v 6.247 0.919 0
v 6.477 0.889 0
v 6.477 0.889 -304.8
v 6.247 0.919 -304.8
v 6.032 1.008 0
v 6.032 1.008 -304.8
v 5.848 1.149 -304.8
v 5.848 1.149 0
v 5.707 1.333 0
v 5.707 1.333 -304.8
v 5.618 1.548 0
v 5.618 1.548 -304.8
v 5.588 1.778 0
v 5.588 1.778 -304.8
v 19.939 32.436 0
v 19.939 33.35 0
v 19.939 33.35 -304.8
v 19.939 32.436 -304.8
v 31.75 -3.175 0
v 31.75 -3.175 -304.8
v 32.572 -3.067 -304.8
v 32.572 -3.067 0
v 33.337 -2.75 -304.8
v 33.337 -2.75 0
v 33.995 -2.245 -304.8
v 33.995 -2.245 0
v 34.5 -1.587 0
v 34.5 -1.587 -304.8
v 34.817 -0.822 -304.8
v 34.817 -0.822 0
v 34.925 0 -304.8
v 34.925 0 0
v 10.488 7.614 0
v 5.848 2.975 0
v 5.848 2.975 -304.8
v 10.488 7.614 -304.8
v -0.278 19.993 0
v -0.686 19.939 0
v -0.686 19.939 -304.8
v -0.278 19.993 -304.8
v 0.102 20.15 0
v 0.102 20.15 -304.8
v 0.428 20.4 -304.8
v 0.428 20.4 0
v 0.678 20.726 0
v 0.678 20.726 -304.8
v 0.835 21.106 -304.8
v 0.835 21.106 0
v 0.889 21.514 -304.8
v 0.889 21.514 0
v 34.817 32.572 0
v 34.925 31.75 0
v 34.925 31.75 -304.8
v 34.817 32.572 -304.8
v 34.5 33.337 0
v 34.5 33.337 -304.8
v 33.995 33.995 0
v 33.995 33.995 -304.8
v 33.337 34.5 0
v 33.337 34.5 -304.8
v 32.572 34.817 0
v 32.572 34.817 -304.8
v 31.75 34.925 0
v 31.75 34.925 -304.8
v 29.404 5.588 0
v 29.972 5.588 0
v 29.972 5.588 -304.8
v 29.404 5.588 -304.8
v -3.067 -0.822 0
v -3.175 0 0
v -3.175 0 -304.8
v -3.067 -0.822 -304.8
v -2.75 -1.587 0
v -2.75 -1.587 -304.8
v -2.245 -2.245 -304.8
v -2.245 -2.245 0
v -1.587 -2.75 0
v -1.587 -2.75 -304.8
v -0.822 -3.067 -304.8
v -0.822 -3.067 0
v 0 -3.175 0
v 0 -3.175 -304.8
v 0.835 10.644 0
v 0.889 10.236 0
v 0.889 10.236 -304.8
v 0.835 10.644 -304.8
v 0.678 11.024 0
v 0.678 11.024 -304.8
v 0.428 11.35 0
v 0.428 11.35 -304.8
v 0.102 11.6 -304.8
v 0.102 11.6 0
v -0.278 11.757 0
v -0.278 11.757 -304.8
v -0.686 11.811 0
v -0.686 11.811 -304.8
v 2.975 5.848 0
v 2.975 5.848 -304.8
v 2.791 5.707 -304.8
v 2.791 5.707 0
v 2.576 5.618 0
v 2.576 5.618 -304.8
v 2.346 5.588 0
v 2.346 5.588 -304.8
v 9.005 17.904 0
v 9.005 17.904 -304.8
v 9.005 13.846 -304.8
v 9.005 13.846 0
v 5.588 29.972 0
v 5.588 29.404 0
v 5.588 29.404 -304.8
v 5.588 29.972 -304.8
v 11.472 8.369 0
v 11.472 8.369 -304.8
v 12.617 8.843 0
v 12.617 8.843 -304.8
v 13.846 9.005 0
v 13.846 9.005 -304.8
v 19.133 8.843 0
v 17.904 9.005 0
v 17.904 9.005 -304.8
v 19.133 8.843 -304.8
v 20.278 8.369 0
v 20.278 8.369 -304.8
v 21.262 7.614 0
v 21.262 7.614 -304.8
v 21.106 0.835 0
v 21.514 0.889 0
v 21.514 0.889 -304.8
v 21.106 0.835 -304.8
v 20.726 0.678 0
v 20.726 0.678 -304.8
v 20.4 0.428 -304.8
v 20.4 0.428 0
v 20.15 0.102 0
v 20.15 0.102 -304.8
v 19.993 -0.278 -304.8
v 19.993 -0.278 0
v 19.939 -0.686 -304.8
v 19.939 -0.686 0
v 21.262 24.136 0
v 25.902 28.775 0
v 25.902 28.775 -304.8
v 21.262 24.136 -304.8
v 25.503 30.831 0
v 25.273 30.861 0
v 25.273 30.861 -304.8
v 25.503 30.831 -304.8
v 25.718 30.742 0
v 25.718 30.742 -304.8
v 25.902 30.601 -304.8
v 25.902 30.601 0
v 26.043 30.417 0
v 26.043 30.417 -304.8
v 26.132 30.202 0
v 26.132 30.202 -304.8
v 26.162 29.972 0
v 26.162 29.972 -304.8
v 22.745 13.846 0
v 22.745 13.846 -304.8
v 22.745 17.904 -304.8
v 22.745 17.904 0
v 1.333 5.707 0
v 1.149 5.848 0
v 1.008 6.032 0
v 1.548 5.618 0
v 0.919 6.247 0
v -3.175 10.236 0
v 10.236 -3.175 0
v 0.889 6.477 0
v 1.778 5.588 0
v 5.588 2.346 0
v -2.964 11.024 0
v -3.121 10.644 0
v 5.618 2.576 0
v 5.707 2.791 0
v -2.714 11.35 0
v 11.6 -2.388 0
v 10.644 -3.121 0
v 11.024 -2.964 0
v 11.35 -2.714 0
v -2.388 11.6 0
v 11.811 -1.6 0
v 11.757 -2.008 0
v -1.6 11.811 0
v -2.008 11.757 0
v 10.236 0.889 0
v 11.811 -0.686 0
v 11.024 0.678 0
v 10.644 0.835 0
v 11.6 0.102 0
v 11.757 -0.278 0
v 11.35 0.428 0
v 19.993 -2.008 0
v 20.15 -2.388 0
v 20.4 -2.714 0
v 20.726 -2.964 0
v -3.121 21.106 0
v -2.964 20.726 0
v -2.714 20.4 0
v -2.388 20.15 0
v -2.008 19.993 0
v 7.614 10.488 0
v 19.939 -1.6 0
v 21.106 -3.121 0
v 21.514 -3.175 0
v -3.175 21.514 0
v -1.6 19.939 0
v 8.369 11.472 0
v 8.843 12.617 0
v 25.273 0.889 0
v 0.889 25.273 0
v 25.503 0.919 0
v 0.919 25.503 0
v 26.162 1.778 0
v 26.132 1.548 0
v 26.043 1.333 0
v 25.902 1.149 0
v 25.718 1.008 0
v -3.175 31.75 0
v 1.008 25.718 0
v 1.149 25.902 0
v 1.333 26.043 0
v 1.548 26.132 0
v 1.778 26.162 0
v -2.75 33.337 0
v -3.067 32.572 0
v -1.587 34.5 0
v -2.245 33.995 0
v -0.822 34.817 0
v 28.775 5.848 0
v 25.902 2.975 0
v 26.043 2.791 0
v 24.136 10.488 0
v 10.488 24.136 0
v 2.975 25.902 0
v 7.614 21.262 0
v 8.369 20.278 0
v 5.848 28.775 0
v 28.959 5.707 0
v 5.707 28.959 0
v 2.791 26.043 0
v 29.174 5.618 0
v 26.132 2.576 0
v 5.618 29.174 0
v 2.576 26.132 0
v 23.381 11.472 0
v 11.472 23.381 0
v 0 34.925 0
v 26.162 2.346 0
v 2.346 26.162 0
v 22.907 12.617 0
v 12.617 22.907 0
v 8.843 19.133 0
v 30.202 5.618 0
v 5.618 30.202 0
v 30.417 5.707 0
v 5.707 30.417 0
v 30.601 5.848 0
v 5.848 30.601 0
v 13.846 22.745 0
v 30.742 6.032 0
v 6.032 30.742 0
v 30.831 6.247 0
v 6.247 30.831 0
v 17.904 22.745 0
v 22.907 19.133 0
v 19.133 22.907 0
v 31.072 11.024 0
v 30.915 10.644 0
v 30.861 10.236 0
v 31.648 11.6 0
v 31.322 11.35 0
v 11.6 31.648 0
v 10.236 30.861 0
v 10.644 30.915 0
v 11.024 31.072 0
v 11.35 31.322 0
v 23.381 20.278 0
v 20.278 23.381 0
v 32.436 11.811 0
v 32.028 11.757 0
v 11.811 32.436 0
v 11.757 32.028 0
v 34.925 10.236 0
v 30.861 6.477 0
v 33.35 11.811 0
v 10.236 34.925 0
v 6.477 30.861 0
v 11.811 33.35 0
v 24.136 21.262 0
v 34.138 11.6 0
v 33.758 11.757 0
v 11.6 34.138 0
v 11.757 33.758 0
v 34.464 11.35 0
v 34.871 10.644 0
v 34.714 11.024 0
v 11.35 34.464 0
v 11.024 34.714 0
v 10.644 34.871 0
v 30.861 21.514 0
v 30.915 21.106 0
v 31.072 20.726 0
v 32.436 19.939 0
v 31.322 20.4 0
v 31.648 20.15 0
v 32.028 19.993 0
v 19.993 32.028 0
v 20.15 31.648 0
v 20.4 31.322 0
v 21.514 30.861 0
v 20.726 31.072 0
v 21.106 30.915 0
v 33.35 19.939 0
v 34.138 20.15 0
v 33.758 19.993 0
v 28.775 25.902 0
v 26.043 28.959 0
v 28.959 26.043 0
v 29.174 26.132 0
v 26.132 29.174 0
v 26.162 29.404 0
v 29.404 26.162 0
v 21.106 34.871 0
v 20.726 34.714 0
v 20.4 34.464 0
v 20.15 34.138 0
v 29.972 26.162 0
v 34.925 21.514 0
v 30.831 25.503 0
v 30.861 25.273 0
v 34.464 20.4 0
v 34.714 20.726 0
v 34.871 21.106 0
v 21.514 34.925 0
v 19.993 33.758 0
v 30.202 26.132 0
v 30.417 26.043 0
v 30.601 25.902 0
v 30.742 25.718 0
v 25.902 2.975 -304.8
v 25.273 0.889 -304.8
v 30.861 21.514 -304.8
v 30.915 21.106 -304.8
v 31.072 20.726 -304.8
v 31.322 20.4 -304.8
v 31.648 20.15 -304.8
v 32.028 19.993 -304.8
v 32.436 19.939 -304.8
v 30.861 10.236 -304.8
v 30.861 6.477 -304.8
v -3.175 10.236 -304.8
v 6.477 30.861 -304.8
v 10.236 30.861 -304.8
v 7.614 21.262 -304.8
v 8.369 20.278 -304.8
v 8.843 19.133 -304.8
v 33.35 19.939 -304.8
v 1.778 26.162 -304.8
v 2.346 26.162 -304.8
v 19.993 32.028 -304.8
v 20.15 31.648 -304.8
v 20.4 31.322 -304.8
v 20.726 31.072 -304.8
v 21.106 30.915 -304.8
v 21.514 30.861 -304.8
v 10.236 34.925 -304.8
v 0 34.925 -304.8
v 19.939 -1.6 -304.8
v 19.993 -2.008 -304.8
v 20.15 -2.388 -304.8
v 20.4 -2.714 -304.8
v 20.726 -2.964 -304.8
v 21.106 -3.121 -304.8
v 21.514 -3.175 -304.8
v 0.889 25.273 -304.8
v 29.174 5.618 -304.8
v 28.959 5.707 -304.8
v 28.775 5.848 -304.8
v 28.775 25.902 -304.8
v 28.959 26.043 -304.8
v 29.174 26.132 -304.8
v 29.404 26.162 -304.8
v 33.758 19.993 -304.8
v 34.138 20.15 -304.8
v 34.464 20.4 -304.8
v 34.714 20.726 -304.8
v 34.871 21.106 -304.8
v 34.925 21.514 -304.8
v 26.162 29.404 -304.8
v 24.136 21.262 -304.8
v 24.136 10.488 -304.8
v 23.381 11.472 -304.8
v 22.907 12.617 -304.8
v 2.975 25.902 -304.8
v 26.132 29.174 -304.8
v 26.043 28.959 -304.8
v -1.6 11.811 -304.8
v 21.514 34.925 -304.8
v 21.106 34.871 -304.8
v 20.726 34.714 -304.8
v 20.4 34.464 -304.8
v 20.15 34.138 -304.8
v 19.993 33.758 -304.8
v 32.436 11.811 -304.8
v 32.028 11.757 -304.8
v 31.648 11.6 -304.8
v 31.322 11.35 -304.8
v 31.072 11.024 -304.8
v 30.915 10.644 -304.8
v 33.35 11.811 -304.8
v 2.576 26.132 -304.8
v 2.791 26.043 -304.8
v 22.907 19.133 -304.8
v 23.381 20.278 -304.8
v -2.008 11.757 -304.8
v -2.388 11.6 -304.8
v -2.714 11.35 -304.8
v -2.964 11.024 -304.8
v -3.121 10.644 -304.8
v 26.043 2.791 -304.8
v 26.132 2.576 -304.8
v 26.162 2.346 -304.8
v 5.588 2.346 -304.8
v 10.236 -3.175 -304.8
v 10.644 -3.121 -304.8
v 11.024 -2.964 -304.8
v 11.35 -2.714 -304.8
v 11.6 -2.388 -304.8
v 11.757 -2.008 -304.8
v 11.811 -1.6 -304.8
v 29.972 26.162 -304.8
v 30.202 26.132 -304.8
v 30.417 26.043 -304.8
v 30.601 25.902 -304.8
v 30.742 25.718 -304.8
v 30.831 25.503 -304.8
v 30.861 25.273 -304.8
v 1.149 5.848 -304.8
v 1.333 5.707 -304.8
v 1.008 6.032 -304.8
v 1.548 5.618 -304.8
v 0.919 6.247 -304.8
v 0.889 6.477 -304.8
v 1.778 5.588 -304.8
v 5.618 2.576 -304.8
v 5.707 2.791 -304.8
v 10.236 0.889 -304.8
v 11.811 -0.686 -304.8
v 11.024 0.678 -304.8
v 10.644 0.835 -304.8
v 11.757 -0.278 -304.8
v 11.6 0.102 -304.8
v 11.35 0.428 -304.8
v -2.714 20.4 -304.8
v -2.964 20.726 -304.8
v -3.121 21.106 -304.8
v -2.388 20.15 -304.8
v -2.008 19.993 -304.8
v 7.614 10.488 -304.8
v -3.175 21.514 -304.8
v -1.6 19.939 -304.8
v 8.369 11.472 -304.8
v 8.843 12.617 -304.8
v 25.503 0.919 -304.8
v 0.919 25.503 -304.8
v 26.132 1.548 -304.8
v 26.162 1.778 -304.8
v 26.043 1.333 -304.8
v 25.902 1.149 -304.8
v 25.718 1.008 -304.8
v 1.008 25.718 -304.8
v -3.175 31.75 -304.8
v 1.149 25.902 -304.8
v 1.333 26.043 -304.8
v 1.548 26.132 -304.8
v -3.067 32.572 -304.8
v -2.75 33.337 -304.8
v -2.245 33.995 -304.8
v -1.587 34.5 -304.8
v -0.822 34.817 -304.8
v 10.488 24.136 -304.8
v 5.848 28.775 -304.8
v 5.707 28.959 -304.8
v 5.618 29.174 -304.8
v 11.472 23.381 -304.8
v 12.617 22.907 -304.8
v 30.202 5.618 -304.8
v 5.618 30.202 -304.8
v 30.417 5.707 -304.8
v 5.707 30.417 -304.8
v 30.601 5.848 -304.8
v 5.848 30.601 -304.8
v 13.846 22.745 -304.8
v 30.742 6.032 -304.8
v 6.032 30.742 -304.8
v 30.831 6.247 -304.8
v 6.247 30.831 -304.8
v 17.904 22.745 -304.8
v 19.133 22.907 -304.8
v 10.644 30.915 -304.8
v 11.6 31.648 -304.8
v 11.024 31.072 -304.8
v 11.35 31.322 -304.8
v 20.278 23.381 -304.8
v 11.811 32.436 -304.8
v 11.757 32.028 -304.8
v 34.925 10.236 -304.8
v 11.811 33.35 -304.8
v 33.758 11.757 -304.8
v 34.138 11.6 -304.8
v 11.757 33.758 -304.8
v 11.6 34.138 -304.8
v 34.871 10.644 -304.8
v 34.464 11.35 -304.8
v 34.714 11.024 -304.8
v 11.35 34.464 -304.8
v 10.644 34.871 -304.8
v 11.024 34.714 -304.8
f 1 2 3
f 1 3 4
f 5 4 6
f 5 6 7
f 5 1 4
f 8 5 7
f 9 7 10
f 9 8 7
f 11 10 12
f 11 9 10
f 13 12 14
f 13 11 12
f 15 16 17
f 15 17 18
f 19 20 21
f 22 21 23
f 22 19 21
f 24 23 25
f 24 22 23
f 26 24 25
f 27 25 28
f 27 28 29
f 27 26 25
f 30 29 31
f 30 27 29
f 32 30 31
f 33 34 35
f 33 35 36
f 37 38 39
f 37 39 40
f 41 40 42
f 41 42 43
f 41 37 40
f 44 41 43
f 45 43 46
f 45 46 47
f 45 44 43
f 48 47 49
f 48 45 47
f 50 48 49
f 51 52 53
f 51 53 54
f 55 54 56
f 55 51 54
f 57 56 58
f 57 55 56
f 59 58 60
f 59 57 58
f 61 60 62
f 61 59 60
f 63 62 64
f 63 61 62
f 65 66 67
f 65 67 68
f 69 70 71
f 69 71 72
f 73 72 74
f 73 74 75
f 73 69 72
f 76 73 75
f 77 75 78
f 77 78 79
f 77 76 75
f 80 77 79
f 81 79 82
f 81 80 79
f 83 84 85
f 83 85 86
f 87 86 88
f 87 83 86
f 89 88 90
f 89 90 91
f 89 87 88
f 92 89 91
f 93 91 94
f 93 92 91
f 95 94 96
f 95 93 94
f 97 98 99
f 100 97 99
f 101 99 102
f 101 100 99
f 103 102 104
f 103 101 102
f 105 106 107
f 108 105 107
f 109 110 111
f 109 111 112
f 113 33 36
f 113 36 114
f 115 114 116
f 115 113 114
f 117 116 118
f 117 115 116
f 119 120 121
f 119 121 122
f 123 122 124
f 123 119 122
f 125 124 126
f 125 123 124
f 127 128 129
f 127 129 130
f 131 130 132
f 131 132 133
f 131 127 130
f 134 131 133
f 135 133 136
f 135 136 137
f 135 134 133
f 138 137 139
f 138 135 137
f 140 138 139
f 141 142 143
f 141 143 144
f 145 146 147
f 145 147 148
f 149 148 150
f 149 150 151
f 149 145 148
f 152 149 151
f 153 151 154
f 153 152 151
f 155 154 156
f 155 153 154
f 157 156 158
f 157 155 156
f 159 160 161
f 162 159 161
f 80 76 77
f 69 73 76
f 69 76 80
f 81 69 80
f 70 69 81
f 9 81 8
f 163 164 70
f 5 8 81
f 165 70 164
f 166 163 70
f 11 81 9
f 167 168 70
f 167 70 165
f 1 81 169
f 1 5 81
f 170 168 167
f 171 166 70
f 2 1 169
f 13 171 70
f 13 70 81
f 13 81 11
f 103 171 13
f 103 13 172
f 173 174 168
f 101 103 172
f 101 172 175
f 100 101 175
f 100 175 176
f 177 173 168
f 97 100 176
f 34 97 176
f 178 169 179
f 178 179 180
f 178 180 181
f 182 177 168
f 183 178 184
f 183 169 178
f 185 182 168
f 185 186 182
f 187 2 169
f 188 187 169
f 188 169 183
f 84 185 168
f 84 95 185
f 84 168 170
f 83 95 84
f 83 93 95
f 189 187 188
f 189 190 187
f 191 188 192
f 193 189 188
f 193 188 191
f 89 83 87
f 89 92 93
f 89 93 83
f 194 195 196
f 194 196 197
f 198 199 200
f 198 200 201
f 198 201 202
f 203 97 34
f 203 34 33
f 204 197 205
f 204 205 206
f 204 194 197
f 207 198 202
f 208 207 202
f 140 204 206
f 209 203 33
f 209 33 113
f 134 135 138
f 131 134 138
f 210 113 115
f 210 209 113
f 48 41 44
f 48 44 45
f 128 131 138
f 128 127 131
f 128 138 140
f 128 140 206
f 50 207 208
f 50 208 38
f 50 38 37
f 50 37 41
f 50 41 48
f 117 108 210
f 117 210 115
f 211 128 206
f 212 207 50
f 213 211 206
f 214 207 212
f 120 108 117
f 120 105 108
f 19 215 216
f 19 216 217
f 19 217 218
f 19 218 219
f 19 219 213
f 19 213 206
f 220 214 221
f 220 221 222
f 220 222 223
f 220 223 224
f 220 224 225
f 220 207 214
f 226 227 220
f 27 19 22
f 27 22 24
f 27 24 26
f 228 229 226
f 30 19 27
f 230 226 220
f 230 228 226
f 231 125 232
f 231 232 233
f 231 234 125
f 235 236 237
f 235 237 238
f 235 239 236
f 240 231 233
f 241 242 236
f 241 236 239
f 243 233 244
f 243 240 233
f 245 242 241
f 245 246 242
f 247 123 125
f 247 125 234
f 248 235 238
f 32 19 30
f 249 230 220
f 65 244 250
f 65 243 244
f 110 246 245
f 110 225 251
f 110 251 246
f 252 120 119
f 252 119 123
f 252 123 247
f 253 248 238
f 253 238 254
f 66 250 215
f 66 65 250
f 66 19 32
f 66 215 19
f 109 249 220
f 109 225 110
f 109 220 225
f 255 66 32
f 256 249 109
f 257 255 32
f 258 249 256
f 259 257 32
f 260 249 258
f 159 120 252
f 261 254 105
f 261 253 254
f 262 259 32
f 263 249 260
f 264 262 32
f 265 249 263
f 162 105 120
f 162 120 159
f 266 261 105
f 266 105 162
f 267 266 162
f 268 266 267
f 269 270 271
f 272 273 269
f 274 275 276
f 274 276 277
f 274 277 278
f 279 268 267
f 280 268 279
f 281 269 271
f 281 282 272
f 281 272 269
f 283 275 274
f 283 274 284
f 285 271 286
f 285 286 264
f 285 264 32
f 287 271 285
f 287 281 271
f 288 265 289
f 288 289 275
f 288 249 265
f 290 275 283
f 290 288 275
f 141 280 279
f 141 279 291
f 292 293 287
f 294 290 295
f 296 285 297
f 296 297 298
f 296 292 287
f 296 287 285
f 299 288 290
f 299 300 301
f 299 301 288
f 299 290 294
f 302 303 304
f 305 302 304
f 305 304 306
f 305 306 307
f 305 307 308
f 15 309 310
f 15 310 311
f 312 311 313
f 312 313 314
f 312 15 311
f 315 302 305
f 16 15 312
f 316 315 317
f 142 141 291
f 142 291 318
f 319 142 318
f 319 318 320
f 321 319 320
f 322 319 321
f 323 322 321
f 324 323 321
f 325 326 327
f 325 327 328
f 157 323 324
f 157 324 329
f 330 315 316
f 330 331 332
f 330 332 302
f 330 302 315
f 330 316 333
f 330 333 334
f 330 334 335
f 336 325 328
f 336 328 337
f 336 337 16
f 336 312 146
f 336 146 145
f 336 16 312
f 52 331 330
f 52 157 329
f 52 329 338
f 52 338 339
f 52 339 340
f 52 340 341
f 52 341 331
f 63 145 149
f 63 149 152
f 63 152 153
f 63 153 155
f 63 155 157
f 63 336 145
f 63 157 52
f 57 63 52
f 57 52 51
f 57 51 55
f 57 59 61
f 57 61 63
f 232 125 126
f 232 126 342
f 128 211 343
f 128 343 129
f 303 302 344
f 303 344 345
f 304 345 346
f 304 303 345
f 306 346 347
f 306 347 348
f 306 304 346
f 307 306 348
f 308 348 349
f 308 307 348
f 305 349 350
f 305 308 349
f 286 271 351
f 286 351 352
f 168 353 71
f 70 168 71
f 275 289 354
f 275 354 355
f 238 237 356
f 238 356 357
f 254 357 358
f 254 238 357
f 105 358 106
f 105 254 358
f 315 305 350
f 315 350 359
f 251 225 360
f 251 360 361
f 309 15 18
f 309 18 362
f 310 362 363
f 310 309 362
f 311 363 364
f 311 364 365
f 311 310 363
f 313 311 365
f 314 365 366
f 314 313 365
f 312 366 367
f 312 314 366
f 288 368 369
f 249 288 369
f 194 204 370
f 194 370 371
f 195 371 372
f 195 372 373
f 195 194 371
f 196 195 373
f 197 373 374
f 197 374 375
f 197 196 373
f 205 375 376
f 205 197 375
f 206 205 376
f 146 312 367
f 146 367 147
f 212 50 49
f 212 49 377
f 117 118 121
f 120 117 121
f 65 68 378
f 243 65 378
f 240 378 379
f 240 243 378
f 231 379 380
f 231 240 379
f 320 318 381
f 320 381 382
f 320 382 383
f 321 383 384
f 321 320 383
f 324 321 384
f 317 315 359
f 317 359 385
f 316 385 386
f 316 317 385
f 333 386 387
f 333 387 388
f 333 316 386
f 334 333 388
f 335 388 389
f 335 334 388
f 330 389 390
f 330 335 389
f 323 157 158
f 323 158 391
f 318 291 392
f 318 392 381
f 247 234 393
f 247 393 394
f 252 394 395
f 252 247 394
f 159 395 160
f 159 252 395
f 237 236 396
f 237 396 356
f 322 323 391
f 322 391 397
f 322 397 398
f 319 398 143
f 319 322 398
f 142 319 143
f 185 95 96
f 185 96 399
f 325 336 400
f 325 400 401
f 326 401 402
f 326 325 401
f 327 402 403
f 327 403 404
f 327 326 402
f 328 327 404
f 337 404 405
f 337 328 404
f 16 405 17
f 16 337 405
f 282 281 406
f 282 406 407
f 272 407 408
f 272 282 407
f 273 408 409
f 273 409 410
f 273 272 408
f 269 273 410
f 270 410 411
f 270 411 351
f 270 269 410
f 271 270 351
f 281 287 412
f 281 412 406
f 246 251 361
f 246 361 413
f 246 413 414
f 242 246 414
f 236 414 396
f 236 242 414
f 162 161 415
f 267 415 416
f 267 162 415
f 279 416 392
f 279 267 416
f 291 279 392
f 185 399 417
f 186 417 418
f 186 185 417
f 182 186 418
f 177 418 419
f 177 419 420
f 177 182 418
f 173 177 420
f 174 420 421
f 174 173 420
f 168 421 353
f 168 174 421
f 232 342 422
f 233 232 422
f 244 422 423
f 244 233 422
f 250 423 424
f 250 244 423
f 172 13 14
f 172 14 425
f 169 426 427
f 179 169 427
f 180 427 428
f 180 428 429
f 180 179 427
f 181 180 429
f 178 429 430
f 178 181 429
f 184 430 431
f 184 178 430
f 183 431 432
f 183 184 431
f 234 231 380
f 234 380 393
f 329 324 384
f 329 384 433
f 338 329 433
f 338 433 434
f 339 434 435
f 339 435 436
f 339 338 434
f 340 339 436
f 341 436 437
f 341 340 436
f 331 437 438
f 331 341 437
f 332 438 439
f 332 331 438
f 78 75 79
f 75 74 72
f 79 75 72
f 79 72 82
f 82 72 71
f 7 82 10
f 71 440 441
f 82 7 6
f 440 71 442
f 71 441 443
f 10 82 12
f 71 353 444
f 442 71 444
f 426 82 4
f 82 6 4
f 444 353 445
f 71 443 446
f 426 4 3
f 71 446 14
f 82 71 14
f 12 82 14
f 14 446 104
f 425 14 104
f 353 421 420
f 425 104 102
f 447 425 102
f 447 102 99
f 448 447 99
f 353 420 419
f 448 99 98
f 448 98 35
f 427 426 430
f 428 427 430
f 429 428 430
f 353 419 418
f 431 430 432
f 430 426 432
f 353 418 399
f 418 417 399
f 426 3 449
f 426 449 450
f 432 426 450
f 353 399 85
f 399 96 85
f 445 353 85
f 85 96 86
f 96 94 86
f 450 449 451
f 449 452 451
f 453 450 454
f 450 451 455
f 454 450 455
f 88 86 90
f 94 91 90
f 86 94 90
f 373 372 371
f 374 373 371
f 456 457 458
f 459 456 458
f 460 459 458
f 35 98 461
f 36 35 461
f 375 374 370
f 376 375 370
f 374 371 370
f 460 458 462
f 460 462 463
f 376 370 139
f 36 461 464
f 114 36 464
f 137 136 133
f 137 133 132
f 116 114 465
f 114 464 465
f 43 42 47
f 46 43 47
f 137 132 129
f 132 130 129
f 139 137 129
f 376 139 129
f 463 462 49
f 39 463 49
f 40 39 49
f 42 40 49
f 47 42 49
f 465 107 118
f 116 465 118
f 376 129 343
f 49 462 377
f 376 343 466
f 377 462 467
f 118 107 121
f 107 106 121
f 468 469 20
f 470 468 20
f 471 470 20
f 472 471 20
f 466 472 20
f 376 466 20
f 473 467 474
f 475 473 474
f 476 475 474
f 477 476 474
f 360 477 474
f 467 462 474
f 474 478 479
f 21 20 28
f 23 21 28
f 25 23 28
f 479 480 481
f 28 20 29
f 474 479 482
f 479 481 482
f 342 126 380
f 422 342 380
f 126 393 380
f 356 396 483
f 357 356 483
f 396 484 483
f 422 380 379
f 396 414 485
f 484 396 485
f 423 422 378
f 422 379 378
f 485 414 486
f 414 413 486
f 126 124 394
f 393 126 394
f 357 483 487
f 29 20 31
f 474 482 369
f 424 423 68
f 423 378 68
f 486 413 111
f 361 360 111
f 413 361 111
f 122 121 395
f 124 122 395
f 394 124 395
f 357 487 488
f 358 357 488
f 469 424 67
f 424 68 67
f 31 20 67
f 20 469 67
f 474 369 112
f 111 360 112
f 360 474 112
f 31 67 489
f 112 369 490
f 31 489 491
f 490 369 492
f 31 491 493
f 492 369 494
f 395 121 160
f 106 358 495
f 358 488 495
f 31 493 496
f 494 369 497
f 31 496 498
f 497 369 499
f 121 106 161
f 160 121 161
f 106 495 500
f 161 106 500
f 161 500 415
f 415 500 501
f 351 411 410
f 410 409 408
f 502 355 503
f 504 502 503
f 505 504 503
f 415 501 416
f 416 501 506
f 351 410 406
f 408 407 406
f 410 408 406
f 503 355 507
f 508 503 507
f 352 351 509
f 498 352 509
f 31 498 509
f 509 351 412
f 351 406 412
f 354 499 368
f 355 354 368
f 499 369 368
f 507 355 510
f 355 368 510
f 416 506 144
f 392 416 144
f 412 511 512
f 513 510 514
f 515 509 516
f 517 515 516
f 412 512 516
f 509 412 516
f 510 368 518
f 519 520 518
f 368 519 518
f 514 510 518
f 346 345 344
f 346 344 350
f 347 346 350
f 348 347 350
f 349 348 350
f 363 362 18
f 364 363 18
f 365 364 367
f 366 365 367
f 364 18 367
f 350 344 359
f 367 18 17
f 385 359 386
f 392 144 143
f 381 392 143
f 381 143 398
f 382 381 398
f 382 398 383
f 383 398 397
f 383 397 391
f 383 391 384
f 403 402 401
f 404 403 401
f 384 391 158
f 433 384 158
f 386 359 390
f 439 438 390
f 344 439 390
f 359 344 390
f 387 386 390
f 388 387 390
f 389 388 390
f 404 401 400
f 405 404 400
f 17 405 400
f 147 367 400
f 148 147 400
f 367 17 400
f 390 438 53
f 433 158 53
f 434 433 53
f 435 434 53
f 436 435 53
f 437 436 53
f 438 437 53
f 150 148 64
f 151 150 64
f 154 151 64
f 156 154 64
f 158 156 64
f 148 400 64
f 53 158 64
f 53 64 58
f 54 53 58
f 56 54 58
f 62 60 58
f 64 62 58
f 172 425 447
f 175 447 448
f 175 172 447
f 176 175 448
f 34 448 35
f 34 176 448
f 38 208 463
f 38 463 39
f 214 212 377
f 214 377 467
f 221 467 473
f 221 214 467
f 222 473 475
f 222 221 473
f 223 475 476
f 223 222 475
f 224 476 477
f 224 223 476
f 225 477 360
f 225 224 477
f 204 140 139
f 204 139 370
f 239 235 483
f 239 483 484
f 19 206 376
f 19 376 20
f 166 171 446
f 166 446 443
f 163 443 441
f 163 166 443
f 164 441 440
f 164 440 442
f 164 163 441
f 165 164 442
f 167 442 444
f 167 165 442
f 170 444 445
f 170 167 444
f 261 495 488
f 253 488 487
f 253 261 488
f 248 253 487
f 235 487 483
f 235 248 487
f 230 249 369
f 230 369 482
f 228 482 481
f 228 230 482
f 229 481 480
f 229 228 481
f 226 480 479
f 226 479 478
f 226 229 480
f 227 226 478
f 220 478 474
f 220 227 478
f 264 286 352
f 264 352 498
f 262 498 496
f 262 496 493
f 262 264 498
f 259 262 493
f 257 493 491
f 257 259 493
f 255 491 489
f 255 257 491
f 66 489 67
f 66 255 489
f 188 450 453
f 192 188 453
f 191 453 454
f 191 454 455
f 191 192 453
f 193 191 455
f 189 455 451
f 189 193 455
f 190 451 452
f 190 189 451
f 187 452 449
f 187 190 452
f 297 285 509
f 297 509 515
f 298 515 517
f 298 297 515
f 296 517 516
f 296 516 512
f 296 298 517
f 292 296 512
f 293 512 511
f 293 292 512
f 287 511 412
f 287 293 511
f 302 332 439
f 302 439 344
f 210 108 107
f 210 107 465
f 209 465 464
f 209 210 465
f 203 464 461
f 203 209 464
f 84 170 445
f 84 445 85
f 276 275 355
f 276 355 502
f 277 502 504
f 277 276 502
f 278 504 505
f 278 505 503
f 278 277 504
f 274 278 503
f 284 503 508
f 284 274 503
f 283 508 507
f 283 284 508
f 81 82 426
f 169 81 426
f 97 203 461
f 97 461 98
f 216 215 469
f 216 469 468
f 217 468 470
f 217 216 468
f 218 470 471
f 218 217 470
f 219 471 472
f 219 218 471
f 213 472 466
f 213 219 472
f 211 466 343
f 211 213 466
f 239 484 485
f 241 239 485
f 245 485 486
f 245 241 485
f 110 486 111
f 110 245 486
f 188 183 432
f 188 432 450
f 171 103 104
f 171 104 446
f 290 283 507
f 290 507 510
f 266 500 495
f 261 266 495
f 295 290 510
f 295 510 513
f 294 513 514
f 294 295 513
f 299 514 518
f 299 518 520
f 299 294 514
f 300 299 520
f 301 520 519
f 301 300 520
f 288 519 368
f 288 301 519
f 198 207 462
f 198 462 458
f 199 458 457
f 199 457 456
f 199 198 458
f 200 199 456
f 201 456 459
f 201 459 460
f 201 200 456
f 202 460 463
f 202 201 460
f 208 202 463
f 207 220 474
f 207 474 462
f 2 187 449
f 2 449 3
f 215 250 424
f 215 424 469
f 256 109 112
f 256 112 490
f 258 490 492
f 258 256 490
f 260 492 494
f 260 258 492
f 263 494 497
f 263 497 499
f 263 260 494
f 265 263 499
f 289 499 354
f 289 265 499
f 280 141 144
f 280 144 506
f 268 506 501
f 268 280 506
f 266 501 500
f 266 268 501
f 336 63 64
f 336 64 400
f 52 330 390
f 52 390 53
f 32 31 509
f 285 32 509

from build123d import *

# Parameters (mm, degrees)
F1_DEPTH = 304.8


with BuildPart() as f1:
    # F0 (on Top) → F1 (new body)
    with BuildSketch(Plane.XY):
        with BuildLine():
            ThreePointArc((0, 34.925), (-2.245064, 33.995064), (-3.175, 31.75))
            Line((-3.175, 31.75), (-3.175, 21.5138))
            ThreePointArc((-3.175, 21.5138), (-2.713752, 20.400248), (-1.6002, 19.939))
            Line((-1.6002, 19.939), (-0.6858, 19.939))
            ThreePointArc((-0.6858, 19.939), (0.427752, 20.400248), (0.889, 21.5138))
            Line((0.889, 21.5138), (0.889, 25.273))
            ThreePointArc((0.889, 25.273), (1.149382, 25.901618), (1.778, 26.162))
            Line((1.778, 26.162), (2.346082, 26.162))
            ThreePointArc((2.346082, 26.162), (2.686288, 26.094329), (2.9747, 25.901618))
            Line((2.9747, 25.901618), (7.61416, 21.262158))
            ThreePointArc((7.61416, 21.262158), (8.643787, 19.721212), (9.005344, 17.903543))
            Line((9.005344, 17.903543), (9.005344, 13.846457))
            ThreePointArc((9.005344, 13.846457), (8.643787, 12.028788), (7.61416, 10.487842))
            Line((7.61416, 10.487842), (2.9747, 5.848382))
            ThreePointArc((2.9747, 5.848382), (2.686288, 5.655671), (2.346082, 5.588))
            Line((2.346082, 5.588), (1.778, 5.588))
            ThreePointArc((1.778, 5.588), (1.149382, 5.848382), (0.889, 6.477))
            Line((0.889, 6.477), (0.889, 10.2362))
            ThreePointArc((0.889, 10.2362), (0.427752, 11.349752), (-0.6858, 11.811))
            Line((-0.6858, 11.811), (-1.6002, 11.811))
            ThreePointArc((-1.6002, 11.811), (-2.713752, 11.349752), (-3.175, 10.2362))
            Line((-3.175, 10.2362), (-3.175, 0))
            ThreePointArc((-3.175, 0), (-2.245064, -2.245064), (0, -3.175))
            Line((0, -3.175), (10.2362, -3.175))
            ThreePointArc((10.2362, -3.175), (11.349752, -2.713752), (11.811, -1.6002))
            Line((11.811, -1.6002), (11.811, -0.6858))
            ThreePointArc((11.811, -0.6858), (11.349752, 0.427752), (10.2362, 0.889))
            Line((10.2362, 0.889), (6.477, 0.889))
            ThreePointArc((6.477, 0.889), (5.848382, 1.149382), (5.588, 1.778))
            Line((5.588, 1.778), (5.588, 2.346082))
            ThreePointArc((5.588, 2.346082), (5.655671, 2.686288), (5.848382, 2.9747))
            Line((5.848382, 2.9747), (10.487842, 7.61416))
            ThreePointArc((10.487842, 7.61416), (12.028788, 8.643787), (13.846457, 9.005344))
            Line((13.846457, 9.005344), (17.903543, 9.005344))
            ThreePointArc((17.903543, 9.005344), (19.721212, 8.643787), (21.262158, 7.61416))
            Line((21.262158, 7.61416), (25.901618, 2.9747))
            ThreePointArc((25.901618, 2.9747), (26.094329, 2.686288), (26.162, 2.346082))
            Line((26.162, 2.346082), (26.162, 1.778))
            ThreePointArc((26.162, 1.778), (25.901618, 1.149382), (25.273, 0.889))
            Line((25.273, 0.889), (21.5138, 0.889))
            ThreePointArc((21.5138, 0.889), (20.400248, 0.427752), (19.939, -0.6858))
            Line((19.939, -0.6858), (19.939, -1.6002))
            ThreePointArc((19.939, -1.6002), (20.400248, -2.713752), (21.5138, -3.175))
            Line((21.5138, -3.175), (31.75, -3.175))
            ThreePointArc((31.75, -3.175), (33.995064, -2.245064), (34.925, 0))
            Line((34.925, 0), (34.925, 10.2362))
            ThreePointArc((34.925, 10.2362), (34.463752, 11.349752), (33.3502, 11.811))
            Line((33.3502, 11.811), (32.4358, 11.811))
            ThreePointArc((32.4358, 11.811), (31.322248, 11.349752), (30.861, 10.2362))
            Line((30.861, 10.2362), (30.861, 6.477))
            ThreePointArc((30.861, 6.477), (30.600618, 5.848382), (29.972, 5.588))
            Line((29.972, 5.588), (29.403918, 5.588))
            ThreePointArc((29.403918, 5.588), (29.063712, 5.655671), (28.7753, 5.848382))
            Line((28.7753, 5.848382), (24.13584, 10.487842))
            ThreePointArc((24.13584, 10.487842), (23.106213, 12.028788), (22.744656, 13.846457))
            Line((22.744656, 13.846457), (22.744656, 17.903543))
            ThreePointArc((22.744656, 17.903543), (23.106213, 19.721212), (24.13584, 21.262158))
            Line((24.13584, 21.262158), (28.7753, 25.901618))
            ThreePointArc((28.7753, 25.901618), (29.063712, 26.094329), (29.403918, 26.162))
            Line((29.403918, 26.162), (29.972, 26.162))
            ThreePointArc((29.972, 26.162), (30.600618, 25.901618), (30.861, 25.273))
            Line((30.861, 25.273), (30.861, 21.5138))
            ThreePointArc((30.861, 21.5138), (31.322248, 20.400248), (32.4358, 19.939))
            Line((32.4358, 19.939), (33.3502, 19.939))
            ThreePointArc((33.3502, 19.939), (34.463752, 20.400248), (34.925, 21.5138))
            Line((34.925, 21.5138), (34.925, 31.75))
            ThreePointArc((34.925, 31.75), (33.995064, 33.995064), (31.75, 34.925))
            Line((31.75, 34.925), (21.5138, 34.925))
            ThreePointArc((21.5138, 34.925), (20.400248, 34.463752), (19.939, 33.3502))
            Line((19.939, 33.3502), (19.939, 32.4358))
            ThreePointArc((19.939, 32.4358), (20.400248, 31.322248), (21.5138, 30.861))
            Line((21.5138, 30.861), (25.273, 30.861))
            ThreePointArc((25.273, 30.861), (25.901618, 30.600618), (26.162, 29.972))
            Line((26.162, 29.972), (26.162, 29.403918))
            ThreePointArc((26.162, 29.403918), (26.094329, 29.063712), (25.901618, 28.7753))
            Line((25.901618, 28.7753), (21.262158, 24.13584))
            ThreePointArc((21.262158, 24.13584), (19.721212, 23.106213), (17.903543, 22.744656))
            Line((17.903543, 22.744656), (13.846457, 22.744656))
            ThreePointArc((13.846457, 22.744656), (12.028788, 23.106213), (10.487842, 24.13584))
            Line((10.487842, 24.13584), (5.848382, 28.7753))
            ThreePointArc((5.848382, 28.7753), (5.655671, 29.063712), (5.588, 29.403918))
            Line((5.588, 29.403918), (5.588, 29.972))
            ThreePointArc((5.588, 29.972), (5.848382, 30.600618), (6.477, 30.861))
            Line((6.477, 30.861), (10.2362, 30.861))
            ThreePointArc((10.2362, 30.861), (11.349752, 31.322248), (11.811, 32.4358))
            Line((11.811, 32.4358), (11.811, 33.3502))
            ThreePointArc((11.811, 33.3502), (11.349752, 34.463752), (10.2362, 34.925))
            Line((10.2362, 34.925), (0, 34.925))
        make_face()
    extrude(amount=-F1_DEPTH)


solid = f1.part
